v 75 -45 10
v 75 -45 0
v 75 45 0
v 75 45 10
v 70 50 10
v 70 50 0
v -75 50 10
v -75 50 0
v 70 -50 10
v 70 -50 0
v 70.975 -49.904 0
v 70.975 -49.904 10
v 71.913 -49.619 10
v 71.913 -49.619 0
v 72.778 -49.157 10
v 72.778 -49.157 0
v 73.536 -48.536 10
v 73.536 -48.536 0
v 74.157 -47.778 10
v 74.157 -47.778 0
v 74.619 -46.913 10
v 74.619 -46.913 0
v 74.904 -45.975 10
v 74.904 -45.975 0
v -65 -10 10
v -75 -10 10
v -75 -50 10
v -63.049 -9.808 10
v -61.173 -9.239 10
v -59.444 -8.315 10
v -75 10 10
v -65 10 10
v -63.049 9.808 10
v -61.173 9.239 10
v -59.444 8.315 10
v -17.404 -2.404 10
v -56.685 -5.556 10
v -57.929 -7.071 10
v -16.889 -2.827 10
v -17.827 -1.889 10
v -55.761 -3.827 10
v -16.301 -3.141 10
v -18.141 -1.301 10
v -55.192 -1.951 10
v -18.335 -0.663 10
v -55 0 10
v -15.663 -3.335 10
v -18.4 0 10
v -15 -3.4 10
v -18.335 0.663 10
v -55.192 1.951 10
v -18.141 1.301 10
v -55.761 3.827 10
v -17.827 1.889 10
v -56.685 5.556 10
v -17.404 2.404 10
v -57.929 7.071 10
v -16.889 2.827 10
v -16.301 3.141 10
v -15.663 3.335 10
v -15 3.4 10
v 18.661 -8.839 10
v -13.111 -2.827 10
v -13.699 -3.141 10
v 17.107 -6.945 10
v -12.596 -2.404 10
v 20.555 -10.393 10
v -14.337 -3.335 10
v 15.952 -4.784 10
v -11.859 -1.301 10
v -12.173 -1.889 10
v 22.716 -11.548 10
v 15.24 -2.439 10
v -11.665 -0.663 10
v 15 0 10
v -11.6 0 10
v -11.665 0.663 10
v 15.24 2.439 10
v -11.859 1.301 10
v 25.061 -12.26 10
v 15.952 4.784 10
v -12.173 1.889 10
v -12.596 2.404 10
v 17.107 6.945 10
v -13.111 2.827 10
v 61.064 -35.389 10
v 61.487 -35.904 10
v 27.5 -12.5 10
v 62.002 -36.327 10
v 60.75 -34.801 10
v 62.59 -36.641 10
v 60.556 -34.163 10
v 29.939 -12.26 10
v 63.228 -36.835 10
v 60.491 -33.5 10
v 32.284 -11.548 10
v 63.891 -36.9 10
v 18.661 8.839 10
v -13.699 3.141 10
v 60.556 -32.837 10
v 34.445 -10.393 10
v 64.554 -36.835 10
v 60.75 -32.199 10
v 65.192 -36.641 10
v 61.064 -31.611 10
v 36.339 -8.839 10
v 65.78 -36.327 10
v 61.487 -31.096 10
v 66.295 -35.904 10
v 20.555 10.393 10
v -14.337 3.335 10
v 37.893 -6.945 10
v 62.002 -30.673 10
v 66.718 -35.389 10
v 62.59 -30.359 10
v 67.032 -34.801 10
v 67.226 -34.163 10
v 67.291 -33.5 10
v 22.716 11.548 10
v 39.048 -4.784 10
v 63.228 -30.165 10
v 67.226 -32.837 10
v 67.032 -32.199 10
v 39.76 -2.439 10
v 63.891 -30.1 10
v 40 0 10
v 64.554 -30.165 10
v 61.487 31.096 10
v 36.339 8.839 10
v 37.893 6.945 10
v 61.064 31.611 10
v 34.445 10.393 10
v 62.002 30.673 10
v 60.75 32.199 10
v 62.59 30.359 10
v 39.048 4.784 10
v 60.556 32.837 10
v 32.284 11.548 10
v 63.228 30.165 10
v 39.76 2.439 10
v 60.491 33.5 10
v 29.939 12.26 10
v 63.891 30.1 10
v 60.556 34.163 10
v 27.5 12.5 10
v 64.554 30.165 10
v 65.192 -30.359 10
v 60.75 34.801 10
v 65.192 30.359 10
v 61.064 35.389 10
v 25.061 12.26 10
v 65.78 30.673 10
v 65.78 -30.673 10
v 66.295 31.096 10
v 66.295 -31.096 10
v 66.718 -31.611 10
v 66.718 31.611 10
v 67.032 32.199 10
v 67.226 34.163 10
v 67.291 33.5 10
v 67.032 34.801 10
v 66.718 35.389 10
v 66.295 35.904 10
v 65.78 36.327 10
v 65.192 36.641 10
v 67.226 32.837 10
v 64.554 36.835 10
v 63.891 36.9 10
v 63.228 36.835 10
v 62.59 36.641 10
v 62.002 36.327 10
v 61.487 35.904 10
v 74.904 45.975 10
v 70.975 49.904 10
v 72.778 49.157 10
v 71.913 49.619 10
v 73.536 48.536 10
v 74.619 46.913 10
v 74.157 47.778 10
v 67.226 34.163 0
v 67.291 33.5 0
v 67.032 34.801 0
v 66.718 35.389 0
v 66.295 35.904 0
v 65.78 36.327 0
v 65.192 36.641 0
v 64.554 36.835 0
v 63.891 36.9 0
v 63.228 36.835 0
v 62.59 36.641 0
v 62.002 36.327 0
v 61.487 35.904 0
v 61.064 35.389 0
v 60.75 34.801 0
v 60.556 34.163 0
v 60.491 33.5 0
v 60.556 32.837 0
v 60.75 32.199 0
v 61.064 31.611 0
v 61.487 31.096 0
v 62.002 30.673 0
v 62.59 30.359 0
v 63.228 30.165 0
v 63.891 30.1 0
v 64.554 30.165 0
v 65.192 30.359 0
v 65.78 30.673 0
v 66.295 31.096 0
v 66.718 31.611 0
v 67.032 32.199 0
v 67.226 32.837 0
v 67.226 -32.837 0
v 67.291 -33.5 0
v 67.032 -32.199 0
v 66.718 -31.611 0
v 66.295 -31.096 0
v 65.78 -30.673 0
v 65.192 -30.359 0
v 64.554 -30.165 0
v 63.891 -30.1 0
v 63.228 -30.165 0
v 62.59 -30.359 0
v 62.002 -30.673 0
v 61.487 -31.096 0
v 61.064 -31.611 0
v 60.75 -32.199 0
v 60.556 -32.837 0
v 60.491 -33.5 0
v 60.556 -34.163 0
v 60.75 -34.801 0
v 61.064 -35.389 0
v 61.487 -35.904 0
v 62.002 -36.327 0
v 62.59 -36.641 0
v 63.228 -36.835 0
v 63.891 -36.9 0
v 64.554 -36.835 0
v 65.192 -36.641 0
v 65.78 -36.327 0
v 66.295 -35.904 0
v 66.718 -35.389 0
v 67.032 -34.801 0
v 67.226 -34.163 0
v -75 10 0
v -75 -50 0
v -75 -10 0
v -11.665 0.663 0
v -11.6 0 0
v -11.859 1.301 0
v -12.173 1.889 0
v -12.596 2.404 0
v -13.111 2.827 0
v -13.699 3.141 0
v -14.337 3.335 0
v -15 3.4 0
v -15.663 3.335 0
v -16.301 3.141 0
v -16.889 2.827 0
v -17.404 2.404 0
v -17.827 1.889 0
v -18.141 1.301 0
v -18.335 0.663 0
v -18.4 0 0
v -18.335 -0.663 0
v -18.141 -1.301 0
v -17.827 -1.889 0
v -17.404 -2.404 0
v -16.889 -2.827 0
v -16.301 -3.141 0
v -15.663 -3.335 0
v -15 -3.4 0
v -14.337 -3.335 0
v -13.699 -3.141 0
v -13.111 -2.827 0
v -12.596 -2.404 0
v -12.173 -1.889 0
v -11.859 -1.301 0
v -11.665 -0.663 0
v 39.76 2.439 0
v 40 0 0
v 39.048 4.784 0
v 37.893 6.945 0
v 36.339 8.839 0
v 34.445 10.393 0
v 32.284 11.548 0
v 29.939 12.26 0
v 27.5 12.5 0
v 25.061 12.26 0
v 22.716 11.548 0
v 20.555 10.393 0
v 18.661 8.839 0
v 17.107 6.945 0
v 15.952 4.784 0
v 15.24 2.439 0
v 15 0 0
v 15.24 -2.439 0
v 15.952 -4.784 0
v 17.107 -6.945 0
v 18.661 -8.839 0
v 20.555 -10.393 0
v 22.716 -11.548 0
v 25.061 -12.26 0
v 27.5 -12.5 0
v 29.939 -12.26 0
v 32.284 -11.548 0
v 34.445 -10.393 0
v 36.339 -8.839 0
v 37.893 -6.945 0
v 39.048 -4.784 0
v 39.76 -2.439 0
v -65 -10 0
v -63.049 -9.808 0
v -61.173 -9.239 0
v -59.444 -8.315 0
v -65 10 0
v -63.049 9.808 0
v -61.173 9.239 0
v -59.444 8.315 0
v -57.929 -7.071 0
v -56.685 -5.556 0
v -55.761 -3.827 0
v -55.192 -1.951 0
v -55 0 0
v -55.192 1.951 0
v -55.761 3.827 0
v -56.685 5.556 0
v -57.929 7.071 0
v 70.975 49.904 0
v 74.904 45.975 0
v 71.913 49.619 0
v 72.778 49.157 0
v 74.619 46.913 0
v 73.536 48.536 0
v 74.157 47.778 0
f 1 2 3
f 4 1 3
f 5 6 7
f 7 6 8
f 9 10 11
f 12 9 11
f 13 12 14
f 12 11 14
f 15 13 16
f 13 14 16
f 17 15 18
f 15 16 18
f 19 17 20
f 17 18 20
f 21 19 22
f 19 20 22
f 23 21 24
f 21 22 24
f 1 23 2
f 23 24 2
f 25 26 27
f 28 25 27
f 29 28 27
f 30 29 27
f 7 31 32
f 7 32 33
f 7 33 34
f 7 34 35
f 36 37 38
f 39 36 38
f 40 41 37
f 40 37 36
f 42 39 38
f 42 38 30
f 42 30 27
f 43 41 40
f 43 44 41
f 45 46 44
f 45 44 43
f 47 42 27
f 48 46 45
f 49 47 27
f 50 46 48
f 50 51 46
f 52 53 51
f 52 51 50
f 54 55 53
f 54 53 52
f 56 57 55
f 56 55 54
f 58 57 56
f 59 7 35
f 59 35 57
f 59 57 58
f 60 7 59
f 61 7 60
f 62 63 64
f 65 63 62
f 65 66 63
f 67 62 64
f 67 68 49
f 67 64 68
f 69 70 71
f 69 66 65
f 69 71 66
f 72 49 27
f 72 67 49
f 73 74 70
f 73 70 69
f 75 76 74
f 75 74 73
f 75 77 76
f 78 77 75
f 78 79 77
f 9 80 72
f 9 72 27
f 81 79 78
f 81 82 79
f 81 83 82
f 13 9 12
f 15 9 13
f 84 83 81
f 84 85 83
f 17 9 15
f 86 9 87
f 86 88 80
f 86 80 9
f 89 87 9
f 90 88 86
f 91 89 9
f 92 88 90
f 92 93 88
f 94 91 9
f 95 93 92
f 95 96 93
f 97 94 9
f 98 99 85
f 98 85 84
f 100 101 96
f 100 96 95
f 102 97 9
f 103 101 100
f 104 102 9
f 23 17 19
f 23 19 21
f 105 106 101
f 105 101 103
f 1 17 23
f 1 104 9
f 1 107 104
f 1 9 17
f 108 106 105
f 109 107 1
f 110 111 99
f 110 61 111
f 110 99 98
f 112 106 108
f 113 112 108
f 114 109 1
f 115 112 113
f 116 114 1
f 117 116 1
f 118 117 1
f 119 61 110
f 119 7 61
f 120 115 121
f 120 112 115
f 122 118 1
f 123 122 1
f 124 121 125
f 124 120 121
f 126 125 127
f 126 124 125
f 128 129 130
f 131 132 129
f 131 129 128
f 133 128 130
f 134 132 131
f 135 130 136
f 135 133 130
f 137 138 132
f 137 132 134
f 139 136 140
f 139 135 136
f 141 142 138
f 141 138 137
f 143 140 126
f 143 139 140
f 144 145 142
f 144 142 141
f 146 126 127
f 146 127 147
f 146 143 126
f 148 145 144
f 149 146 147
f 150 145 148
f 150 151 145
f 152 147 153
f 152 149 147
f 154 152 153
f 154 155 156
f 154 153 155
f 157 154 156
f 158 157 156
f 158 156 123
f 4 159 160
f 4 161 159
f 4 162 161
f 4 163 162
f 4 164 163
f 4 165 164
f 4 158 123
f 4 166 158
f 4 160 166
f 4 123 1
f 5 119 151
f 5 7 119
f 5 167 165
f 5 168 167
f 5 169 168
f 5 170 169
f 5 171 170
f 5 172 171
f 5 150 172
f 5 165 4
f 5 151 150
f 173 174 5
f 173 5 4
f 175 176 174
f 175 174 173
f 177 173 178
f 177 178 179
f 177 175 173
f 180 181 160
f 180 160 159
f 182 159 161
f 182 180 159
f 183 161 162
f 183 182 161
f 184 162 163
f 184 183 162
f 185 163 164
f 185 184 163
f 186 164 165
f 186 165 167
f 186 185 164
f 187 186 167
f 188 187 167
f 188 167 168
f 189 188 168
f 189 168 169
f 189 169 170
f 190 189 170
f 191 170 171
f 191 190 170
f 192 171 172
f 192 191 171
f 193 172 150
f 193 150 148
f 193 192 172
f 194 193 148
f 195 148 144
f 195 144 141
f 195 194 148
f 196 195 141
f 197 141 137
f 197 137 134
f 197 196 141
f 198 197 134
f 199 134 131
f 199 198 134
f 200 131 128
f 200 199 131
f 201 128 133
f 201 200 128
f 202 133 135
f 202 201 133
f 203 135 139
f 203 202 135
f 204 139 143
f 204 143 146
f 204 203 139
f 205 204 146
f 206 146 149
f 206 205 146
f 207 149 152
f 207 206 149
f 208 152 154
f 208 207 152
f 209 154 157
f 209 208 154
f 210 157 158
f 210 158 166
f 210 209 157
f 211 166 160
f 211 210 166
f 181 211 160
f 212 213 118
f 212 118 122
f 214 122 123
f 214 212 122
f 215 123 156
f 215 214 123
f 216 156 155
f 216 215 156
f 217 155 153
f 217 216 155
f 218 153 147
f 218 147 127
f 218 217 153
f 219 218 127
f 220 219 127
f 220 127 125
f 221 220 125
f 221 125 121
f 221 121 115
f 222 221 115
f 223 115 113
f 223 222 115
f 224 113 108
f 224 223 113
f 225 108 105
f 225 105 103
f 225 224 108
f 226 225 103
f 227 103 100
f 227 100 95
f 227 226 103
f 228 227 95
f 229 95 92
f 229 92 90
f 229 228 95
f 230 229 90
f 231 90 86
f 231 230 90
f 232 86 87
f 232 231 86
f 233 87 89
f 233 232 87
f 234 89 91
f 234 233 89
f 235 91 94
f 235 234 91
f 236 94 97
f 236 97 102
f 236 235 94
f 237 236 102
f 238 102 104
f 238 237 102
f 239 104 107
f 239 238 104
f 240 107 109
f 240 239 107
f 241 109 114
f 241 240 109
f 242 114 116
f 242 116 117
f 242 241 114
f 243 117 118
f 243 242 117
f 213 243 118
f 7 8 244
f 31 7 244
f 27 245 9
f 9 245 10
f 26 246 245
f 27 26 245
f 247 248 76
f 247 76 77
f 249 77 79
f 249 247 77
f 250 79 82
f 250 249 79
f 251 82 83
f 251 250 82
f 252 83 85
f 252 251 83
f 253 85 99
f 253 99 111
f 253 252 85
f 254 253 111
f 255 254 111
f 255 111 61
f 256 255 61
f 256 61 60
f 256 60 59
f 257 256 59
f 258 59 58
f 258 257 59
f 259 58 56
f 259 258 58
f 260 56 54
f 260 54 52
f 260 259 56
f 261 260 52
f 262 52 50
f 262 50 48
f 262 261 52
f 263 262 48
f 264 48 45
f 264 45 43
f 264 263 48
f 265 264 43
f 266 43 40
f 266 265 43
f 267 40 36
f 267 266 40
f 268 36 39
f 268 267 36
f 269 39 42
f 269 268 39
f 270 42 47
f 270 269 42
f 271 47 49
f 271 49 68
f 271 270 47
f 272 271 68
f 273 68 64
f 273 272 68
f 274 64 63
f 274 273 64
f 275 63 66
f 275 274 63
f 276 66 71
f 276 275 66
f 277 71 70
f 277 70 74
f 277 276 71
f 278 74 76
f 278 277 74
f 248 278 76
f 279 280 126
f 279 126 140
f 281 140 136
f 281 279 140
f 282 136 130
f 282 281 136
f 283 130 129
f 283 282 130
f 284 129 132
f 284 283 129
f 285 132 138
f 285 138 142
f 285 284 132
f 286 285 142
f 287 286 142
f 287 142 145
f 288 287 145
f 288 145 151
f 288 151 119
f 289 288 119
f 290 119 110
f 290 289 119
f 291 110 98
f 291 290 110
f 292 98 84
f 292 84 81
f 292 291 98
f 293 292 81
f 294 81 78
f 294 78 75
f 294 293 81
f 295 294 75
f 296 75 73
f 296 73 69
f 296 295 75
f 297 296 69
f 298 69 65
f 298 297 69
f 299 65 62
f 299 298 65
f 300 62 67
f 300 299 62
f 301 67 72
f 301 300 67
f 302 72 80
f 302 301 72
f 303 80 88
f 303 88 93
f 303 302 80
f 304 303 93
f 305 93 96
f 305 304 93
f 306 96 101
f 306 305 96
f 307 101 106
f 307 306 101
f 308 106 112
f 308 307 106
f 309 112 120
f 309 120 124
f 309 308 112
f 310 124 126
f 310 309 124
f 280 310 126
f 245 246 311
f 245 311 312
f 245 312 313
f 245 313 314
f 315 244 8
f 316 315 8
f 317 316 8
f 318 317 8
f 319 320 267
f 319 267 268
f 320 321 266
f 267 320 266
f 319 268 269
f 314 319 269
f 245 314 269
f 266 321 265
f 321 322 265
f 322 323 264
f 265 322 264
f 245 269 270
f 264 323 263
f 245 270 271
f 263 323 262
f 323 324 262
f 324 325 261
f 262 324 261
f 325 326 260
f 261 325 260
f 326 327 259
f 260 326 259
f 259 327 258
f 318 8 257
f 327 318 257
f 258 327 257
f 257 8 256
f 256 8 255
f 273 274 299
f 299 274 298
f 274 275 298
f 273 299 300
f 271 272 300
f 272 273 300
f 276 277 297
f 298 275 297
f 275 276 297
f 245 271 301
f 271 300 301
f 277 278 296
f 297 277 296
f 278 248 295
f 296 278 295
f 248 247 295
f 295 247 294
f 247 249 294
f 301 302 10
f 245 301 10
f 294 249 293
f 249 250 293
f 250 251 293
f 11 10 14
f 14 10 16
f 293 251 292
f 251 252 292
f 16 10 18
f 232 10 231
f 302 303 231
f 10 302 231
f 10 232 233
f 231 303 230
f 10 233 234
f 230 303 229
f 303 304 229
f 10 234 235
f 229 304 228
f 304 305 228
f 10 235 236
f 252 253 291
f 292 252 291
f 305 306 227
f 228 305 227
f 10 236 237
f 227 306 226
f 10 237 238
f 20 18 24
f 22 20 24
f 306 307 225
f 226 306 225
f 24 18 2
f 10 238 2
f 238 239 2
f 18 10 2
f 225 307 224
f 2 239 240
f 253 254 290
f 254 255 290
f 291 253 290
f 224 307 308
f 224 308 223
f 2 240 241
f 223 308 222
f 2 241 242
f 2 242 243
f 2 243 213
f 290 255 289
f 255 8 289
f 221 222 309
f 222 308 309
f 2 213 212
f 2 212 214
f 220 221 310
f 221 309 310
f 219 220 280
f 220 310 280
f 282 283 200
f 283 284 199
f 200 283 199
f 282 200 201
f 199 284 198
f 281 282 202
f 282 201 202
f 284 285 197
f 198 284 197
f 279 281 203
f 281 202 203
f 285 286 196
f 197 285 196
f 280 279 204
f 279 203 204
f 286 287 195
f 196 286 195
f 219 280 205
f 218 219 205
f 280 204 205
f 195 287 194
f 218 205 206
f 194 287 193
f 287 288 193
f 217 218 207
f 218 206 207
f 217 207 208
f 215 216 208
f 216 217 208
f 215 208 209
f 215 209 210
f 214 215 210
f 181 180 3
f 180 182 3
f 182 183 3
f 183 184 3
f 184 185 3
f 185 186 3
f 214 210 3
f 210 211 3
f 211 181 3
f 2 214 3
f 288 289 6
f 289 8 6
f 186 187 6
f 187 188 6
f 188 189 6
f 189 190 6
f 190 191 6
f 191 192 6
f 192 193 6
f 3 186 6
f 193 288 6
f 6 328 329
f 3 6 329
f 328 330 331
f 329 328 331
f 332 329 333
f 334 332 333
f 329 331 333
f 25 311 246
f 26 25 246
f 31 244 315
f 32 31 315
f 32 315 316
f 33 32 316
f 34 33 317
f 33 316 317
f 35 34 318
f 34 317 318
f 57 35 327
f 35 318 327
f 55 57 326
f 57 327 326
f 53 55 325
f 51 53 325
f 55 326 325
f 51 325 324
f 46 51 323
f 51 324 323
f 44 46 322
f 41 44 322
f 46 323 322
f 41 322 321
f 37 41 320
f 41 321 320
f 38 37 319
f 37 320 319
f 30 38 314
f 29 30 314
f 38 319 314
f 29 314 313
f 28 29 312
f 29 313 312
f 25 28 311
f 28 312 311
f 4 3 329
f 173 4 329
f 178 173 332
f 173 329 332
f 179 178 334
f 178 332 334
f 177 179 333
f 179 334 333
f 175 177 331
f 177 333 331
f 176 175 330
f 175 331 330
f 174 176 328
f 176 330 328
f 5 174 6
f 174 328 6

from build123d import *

# Parameters (mm, degrees)
F0_R     = 3.4
F0_R_2   = 12.5
F1_DEPTH = 10


with BuildPart() as f1:
    # F0 (on Top) → F1 (new body)
    with BuildSketch(Plane.XY):
        with BuildLine():
            ThreePointArc((75, 45), (73.535534, 48.535534), (70, 50))
            Line((70, 50), (-75, 50))
            Line((-75, 50), (-75, 10))
            Line((-75, 10), (-65, 10))
            ThreePointArc((-65, 10), (-55, 0), (-65, -10))
            Line((-65, -10), (-75, -10))
            Line((-75, -10), (-75, -50))
            Line((-75, -50), (70, -50))
            ThreePointArc((70, -50), (73.535534, -48.535534), (75, -45))
            Line((75, -45), (75, 45))
        make_face()
        with Locations((63.891, -33.5)):
            Circle(F0_R, mode=Mode.SUBTRACT)
        with Locations((-15, 0)):
            Circle(F0_R, mode=Mode.SUBTRACT)
        with Locations((27.5, 0)):
            Circle(F0_R_2, mode=Mode.SUBTRACT)
        with Locations((63.891, 33.5)):
            Circle(F0_R, mode=Mode.SUBTRACT)
    extrude(amount=F1_DEPTH)


solid = f1.part
